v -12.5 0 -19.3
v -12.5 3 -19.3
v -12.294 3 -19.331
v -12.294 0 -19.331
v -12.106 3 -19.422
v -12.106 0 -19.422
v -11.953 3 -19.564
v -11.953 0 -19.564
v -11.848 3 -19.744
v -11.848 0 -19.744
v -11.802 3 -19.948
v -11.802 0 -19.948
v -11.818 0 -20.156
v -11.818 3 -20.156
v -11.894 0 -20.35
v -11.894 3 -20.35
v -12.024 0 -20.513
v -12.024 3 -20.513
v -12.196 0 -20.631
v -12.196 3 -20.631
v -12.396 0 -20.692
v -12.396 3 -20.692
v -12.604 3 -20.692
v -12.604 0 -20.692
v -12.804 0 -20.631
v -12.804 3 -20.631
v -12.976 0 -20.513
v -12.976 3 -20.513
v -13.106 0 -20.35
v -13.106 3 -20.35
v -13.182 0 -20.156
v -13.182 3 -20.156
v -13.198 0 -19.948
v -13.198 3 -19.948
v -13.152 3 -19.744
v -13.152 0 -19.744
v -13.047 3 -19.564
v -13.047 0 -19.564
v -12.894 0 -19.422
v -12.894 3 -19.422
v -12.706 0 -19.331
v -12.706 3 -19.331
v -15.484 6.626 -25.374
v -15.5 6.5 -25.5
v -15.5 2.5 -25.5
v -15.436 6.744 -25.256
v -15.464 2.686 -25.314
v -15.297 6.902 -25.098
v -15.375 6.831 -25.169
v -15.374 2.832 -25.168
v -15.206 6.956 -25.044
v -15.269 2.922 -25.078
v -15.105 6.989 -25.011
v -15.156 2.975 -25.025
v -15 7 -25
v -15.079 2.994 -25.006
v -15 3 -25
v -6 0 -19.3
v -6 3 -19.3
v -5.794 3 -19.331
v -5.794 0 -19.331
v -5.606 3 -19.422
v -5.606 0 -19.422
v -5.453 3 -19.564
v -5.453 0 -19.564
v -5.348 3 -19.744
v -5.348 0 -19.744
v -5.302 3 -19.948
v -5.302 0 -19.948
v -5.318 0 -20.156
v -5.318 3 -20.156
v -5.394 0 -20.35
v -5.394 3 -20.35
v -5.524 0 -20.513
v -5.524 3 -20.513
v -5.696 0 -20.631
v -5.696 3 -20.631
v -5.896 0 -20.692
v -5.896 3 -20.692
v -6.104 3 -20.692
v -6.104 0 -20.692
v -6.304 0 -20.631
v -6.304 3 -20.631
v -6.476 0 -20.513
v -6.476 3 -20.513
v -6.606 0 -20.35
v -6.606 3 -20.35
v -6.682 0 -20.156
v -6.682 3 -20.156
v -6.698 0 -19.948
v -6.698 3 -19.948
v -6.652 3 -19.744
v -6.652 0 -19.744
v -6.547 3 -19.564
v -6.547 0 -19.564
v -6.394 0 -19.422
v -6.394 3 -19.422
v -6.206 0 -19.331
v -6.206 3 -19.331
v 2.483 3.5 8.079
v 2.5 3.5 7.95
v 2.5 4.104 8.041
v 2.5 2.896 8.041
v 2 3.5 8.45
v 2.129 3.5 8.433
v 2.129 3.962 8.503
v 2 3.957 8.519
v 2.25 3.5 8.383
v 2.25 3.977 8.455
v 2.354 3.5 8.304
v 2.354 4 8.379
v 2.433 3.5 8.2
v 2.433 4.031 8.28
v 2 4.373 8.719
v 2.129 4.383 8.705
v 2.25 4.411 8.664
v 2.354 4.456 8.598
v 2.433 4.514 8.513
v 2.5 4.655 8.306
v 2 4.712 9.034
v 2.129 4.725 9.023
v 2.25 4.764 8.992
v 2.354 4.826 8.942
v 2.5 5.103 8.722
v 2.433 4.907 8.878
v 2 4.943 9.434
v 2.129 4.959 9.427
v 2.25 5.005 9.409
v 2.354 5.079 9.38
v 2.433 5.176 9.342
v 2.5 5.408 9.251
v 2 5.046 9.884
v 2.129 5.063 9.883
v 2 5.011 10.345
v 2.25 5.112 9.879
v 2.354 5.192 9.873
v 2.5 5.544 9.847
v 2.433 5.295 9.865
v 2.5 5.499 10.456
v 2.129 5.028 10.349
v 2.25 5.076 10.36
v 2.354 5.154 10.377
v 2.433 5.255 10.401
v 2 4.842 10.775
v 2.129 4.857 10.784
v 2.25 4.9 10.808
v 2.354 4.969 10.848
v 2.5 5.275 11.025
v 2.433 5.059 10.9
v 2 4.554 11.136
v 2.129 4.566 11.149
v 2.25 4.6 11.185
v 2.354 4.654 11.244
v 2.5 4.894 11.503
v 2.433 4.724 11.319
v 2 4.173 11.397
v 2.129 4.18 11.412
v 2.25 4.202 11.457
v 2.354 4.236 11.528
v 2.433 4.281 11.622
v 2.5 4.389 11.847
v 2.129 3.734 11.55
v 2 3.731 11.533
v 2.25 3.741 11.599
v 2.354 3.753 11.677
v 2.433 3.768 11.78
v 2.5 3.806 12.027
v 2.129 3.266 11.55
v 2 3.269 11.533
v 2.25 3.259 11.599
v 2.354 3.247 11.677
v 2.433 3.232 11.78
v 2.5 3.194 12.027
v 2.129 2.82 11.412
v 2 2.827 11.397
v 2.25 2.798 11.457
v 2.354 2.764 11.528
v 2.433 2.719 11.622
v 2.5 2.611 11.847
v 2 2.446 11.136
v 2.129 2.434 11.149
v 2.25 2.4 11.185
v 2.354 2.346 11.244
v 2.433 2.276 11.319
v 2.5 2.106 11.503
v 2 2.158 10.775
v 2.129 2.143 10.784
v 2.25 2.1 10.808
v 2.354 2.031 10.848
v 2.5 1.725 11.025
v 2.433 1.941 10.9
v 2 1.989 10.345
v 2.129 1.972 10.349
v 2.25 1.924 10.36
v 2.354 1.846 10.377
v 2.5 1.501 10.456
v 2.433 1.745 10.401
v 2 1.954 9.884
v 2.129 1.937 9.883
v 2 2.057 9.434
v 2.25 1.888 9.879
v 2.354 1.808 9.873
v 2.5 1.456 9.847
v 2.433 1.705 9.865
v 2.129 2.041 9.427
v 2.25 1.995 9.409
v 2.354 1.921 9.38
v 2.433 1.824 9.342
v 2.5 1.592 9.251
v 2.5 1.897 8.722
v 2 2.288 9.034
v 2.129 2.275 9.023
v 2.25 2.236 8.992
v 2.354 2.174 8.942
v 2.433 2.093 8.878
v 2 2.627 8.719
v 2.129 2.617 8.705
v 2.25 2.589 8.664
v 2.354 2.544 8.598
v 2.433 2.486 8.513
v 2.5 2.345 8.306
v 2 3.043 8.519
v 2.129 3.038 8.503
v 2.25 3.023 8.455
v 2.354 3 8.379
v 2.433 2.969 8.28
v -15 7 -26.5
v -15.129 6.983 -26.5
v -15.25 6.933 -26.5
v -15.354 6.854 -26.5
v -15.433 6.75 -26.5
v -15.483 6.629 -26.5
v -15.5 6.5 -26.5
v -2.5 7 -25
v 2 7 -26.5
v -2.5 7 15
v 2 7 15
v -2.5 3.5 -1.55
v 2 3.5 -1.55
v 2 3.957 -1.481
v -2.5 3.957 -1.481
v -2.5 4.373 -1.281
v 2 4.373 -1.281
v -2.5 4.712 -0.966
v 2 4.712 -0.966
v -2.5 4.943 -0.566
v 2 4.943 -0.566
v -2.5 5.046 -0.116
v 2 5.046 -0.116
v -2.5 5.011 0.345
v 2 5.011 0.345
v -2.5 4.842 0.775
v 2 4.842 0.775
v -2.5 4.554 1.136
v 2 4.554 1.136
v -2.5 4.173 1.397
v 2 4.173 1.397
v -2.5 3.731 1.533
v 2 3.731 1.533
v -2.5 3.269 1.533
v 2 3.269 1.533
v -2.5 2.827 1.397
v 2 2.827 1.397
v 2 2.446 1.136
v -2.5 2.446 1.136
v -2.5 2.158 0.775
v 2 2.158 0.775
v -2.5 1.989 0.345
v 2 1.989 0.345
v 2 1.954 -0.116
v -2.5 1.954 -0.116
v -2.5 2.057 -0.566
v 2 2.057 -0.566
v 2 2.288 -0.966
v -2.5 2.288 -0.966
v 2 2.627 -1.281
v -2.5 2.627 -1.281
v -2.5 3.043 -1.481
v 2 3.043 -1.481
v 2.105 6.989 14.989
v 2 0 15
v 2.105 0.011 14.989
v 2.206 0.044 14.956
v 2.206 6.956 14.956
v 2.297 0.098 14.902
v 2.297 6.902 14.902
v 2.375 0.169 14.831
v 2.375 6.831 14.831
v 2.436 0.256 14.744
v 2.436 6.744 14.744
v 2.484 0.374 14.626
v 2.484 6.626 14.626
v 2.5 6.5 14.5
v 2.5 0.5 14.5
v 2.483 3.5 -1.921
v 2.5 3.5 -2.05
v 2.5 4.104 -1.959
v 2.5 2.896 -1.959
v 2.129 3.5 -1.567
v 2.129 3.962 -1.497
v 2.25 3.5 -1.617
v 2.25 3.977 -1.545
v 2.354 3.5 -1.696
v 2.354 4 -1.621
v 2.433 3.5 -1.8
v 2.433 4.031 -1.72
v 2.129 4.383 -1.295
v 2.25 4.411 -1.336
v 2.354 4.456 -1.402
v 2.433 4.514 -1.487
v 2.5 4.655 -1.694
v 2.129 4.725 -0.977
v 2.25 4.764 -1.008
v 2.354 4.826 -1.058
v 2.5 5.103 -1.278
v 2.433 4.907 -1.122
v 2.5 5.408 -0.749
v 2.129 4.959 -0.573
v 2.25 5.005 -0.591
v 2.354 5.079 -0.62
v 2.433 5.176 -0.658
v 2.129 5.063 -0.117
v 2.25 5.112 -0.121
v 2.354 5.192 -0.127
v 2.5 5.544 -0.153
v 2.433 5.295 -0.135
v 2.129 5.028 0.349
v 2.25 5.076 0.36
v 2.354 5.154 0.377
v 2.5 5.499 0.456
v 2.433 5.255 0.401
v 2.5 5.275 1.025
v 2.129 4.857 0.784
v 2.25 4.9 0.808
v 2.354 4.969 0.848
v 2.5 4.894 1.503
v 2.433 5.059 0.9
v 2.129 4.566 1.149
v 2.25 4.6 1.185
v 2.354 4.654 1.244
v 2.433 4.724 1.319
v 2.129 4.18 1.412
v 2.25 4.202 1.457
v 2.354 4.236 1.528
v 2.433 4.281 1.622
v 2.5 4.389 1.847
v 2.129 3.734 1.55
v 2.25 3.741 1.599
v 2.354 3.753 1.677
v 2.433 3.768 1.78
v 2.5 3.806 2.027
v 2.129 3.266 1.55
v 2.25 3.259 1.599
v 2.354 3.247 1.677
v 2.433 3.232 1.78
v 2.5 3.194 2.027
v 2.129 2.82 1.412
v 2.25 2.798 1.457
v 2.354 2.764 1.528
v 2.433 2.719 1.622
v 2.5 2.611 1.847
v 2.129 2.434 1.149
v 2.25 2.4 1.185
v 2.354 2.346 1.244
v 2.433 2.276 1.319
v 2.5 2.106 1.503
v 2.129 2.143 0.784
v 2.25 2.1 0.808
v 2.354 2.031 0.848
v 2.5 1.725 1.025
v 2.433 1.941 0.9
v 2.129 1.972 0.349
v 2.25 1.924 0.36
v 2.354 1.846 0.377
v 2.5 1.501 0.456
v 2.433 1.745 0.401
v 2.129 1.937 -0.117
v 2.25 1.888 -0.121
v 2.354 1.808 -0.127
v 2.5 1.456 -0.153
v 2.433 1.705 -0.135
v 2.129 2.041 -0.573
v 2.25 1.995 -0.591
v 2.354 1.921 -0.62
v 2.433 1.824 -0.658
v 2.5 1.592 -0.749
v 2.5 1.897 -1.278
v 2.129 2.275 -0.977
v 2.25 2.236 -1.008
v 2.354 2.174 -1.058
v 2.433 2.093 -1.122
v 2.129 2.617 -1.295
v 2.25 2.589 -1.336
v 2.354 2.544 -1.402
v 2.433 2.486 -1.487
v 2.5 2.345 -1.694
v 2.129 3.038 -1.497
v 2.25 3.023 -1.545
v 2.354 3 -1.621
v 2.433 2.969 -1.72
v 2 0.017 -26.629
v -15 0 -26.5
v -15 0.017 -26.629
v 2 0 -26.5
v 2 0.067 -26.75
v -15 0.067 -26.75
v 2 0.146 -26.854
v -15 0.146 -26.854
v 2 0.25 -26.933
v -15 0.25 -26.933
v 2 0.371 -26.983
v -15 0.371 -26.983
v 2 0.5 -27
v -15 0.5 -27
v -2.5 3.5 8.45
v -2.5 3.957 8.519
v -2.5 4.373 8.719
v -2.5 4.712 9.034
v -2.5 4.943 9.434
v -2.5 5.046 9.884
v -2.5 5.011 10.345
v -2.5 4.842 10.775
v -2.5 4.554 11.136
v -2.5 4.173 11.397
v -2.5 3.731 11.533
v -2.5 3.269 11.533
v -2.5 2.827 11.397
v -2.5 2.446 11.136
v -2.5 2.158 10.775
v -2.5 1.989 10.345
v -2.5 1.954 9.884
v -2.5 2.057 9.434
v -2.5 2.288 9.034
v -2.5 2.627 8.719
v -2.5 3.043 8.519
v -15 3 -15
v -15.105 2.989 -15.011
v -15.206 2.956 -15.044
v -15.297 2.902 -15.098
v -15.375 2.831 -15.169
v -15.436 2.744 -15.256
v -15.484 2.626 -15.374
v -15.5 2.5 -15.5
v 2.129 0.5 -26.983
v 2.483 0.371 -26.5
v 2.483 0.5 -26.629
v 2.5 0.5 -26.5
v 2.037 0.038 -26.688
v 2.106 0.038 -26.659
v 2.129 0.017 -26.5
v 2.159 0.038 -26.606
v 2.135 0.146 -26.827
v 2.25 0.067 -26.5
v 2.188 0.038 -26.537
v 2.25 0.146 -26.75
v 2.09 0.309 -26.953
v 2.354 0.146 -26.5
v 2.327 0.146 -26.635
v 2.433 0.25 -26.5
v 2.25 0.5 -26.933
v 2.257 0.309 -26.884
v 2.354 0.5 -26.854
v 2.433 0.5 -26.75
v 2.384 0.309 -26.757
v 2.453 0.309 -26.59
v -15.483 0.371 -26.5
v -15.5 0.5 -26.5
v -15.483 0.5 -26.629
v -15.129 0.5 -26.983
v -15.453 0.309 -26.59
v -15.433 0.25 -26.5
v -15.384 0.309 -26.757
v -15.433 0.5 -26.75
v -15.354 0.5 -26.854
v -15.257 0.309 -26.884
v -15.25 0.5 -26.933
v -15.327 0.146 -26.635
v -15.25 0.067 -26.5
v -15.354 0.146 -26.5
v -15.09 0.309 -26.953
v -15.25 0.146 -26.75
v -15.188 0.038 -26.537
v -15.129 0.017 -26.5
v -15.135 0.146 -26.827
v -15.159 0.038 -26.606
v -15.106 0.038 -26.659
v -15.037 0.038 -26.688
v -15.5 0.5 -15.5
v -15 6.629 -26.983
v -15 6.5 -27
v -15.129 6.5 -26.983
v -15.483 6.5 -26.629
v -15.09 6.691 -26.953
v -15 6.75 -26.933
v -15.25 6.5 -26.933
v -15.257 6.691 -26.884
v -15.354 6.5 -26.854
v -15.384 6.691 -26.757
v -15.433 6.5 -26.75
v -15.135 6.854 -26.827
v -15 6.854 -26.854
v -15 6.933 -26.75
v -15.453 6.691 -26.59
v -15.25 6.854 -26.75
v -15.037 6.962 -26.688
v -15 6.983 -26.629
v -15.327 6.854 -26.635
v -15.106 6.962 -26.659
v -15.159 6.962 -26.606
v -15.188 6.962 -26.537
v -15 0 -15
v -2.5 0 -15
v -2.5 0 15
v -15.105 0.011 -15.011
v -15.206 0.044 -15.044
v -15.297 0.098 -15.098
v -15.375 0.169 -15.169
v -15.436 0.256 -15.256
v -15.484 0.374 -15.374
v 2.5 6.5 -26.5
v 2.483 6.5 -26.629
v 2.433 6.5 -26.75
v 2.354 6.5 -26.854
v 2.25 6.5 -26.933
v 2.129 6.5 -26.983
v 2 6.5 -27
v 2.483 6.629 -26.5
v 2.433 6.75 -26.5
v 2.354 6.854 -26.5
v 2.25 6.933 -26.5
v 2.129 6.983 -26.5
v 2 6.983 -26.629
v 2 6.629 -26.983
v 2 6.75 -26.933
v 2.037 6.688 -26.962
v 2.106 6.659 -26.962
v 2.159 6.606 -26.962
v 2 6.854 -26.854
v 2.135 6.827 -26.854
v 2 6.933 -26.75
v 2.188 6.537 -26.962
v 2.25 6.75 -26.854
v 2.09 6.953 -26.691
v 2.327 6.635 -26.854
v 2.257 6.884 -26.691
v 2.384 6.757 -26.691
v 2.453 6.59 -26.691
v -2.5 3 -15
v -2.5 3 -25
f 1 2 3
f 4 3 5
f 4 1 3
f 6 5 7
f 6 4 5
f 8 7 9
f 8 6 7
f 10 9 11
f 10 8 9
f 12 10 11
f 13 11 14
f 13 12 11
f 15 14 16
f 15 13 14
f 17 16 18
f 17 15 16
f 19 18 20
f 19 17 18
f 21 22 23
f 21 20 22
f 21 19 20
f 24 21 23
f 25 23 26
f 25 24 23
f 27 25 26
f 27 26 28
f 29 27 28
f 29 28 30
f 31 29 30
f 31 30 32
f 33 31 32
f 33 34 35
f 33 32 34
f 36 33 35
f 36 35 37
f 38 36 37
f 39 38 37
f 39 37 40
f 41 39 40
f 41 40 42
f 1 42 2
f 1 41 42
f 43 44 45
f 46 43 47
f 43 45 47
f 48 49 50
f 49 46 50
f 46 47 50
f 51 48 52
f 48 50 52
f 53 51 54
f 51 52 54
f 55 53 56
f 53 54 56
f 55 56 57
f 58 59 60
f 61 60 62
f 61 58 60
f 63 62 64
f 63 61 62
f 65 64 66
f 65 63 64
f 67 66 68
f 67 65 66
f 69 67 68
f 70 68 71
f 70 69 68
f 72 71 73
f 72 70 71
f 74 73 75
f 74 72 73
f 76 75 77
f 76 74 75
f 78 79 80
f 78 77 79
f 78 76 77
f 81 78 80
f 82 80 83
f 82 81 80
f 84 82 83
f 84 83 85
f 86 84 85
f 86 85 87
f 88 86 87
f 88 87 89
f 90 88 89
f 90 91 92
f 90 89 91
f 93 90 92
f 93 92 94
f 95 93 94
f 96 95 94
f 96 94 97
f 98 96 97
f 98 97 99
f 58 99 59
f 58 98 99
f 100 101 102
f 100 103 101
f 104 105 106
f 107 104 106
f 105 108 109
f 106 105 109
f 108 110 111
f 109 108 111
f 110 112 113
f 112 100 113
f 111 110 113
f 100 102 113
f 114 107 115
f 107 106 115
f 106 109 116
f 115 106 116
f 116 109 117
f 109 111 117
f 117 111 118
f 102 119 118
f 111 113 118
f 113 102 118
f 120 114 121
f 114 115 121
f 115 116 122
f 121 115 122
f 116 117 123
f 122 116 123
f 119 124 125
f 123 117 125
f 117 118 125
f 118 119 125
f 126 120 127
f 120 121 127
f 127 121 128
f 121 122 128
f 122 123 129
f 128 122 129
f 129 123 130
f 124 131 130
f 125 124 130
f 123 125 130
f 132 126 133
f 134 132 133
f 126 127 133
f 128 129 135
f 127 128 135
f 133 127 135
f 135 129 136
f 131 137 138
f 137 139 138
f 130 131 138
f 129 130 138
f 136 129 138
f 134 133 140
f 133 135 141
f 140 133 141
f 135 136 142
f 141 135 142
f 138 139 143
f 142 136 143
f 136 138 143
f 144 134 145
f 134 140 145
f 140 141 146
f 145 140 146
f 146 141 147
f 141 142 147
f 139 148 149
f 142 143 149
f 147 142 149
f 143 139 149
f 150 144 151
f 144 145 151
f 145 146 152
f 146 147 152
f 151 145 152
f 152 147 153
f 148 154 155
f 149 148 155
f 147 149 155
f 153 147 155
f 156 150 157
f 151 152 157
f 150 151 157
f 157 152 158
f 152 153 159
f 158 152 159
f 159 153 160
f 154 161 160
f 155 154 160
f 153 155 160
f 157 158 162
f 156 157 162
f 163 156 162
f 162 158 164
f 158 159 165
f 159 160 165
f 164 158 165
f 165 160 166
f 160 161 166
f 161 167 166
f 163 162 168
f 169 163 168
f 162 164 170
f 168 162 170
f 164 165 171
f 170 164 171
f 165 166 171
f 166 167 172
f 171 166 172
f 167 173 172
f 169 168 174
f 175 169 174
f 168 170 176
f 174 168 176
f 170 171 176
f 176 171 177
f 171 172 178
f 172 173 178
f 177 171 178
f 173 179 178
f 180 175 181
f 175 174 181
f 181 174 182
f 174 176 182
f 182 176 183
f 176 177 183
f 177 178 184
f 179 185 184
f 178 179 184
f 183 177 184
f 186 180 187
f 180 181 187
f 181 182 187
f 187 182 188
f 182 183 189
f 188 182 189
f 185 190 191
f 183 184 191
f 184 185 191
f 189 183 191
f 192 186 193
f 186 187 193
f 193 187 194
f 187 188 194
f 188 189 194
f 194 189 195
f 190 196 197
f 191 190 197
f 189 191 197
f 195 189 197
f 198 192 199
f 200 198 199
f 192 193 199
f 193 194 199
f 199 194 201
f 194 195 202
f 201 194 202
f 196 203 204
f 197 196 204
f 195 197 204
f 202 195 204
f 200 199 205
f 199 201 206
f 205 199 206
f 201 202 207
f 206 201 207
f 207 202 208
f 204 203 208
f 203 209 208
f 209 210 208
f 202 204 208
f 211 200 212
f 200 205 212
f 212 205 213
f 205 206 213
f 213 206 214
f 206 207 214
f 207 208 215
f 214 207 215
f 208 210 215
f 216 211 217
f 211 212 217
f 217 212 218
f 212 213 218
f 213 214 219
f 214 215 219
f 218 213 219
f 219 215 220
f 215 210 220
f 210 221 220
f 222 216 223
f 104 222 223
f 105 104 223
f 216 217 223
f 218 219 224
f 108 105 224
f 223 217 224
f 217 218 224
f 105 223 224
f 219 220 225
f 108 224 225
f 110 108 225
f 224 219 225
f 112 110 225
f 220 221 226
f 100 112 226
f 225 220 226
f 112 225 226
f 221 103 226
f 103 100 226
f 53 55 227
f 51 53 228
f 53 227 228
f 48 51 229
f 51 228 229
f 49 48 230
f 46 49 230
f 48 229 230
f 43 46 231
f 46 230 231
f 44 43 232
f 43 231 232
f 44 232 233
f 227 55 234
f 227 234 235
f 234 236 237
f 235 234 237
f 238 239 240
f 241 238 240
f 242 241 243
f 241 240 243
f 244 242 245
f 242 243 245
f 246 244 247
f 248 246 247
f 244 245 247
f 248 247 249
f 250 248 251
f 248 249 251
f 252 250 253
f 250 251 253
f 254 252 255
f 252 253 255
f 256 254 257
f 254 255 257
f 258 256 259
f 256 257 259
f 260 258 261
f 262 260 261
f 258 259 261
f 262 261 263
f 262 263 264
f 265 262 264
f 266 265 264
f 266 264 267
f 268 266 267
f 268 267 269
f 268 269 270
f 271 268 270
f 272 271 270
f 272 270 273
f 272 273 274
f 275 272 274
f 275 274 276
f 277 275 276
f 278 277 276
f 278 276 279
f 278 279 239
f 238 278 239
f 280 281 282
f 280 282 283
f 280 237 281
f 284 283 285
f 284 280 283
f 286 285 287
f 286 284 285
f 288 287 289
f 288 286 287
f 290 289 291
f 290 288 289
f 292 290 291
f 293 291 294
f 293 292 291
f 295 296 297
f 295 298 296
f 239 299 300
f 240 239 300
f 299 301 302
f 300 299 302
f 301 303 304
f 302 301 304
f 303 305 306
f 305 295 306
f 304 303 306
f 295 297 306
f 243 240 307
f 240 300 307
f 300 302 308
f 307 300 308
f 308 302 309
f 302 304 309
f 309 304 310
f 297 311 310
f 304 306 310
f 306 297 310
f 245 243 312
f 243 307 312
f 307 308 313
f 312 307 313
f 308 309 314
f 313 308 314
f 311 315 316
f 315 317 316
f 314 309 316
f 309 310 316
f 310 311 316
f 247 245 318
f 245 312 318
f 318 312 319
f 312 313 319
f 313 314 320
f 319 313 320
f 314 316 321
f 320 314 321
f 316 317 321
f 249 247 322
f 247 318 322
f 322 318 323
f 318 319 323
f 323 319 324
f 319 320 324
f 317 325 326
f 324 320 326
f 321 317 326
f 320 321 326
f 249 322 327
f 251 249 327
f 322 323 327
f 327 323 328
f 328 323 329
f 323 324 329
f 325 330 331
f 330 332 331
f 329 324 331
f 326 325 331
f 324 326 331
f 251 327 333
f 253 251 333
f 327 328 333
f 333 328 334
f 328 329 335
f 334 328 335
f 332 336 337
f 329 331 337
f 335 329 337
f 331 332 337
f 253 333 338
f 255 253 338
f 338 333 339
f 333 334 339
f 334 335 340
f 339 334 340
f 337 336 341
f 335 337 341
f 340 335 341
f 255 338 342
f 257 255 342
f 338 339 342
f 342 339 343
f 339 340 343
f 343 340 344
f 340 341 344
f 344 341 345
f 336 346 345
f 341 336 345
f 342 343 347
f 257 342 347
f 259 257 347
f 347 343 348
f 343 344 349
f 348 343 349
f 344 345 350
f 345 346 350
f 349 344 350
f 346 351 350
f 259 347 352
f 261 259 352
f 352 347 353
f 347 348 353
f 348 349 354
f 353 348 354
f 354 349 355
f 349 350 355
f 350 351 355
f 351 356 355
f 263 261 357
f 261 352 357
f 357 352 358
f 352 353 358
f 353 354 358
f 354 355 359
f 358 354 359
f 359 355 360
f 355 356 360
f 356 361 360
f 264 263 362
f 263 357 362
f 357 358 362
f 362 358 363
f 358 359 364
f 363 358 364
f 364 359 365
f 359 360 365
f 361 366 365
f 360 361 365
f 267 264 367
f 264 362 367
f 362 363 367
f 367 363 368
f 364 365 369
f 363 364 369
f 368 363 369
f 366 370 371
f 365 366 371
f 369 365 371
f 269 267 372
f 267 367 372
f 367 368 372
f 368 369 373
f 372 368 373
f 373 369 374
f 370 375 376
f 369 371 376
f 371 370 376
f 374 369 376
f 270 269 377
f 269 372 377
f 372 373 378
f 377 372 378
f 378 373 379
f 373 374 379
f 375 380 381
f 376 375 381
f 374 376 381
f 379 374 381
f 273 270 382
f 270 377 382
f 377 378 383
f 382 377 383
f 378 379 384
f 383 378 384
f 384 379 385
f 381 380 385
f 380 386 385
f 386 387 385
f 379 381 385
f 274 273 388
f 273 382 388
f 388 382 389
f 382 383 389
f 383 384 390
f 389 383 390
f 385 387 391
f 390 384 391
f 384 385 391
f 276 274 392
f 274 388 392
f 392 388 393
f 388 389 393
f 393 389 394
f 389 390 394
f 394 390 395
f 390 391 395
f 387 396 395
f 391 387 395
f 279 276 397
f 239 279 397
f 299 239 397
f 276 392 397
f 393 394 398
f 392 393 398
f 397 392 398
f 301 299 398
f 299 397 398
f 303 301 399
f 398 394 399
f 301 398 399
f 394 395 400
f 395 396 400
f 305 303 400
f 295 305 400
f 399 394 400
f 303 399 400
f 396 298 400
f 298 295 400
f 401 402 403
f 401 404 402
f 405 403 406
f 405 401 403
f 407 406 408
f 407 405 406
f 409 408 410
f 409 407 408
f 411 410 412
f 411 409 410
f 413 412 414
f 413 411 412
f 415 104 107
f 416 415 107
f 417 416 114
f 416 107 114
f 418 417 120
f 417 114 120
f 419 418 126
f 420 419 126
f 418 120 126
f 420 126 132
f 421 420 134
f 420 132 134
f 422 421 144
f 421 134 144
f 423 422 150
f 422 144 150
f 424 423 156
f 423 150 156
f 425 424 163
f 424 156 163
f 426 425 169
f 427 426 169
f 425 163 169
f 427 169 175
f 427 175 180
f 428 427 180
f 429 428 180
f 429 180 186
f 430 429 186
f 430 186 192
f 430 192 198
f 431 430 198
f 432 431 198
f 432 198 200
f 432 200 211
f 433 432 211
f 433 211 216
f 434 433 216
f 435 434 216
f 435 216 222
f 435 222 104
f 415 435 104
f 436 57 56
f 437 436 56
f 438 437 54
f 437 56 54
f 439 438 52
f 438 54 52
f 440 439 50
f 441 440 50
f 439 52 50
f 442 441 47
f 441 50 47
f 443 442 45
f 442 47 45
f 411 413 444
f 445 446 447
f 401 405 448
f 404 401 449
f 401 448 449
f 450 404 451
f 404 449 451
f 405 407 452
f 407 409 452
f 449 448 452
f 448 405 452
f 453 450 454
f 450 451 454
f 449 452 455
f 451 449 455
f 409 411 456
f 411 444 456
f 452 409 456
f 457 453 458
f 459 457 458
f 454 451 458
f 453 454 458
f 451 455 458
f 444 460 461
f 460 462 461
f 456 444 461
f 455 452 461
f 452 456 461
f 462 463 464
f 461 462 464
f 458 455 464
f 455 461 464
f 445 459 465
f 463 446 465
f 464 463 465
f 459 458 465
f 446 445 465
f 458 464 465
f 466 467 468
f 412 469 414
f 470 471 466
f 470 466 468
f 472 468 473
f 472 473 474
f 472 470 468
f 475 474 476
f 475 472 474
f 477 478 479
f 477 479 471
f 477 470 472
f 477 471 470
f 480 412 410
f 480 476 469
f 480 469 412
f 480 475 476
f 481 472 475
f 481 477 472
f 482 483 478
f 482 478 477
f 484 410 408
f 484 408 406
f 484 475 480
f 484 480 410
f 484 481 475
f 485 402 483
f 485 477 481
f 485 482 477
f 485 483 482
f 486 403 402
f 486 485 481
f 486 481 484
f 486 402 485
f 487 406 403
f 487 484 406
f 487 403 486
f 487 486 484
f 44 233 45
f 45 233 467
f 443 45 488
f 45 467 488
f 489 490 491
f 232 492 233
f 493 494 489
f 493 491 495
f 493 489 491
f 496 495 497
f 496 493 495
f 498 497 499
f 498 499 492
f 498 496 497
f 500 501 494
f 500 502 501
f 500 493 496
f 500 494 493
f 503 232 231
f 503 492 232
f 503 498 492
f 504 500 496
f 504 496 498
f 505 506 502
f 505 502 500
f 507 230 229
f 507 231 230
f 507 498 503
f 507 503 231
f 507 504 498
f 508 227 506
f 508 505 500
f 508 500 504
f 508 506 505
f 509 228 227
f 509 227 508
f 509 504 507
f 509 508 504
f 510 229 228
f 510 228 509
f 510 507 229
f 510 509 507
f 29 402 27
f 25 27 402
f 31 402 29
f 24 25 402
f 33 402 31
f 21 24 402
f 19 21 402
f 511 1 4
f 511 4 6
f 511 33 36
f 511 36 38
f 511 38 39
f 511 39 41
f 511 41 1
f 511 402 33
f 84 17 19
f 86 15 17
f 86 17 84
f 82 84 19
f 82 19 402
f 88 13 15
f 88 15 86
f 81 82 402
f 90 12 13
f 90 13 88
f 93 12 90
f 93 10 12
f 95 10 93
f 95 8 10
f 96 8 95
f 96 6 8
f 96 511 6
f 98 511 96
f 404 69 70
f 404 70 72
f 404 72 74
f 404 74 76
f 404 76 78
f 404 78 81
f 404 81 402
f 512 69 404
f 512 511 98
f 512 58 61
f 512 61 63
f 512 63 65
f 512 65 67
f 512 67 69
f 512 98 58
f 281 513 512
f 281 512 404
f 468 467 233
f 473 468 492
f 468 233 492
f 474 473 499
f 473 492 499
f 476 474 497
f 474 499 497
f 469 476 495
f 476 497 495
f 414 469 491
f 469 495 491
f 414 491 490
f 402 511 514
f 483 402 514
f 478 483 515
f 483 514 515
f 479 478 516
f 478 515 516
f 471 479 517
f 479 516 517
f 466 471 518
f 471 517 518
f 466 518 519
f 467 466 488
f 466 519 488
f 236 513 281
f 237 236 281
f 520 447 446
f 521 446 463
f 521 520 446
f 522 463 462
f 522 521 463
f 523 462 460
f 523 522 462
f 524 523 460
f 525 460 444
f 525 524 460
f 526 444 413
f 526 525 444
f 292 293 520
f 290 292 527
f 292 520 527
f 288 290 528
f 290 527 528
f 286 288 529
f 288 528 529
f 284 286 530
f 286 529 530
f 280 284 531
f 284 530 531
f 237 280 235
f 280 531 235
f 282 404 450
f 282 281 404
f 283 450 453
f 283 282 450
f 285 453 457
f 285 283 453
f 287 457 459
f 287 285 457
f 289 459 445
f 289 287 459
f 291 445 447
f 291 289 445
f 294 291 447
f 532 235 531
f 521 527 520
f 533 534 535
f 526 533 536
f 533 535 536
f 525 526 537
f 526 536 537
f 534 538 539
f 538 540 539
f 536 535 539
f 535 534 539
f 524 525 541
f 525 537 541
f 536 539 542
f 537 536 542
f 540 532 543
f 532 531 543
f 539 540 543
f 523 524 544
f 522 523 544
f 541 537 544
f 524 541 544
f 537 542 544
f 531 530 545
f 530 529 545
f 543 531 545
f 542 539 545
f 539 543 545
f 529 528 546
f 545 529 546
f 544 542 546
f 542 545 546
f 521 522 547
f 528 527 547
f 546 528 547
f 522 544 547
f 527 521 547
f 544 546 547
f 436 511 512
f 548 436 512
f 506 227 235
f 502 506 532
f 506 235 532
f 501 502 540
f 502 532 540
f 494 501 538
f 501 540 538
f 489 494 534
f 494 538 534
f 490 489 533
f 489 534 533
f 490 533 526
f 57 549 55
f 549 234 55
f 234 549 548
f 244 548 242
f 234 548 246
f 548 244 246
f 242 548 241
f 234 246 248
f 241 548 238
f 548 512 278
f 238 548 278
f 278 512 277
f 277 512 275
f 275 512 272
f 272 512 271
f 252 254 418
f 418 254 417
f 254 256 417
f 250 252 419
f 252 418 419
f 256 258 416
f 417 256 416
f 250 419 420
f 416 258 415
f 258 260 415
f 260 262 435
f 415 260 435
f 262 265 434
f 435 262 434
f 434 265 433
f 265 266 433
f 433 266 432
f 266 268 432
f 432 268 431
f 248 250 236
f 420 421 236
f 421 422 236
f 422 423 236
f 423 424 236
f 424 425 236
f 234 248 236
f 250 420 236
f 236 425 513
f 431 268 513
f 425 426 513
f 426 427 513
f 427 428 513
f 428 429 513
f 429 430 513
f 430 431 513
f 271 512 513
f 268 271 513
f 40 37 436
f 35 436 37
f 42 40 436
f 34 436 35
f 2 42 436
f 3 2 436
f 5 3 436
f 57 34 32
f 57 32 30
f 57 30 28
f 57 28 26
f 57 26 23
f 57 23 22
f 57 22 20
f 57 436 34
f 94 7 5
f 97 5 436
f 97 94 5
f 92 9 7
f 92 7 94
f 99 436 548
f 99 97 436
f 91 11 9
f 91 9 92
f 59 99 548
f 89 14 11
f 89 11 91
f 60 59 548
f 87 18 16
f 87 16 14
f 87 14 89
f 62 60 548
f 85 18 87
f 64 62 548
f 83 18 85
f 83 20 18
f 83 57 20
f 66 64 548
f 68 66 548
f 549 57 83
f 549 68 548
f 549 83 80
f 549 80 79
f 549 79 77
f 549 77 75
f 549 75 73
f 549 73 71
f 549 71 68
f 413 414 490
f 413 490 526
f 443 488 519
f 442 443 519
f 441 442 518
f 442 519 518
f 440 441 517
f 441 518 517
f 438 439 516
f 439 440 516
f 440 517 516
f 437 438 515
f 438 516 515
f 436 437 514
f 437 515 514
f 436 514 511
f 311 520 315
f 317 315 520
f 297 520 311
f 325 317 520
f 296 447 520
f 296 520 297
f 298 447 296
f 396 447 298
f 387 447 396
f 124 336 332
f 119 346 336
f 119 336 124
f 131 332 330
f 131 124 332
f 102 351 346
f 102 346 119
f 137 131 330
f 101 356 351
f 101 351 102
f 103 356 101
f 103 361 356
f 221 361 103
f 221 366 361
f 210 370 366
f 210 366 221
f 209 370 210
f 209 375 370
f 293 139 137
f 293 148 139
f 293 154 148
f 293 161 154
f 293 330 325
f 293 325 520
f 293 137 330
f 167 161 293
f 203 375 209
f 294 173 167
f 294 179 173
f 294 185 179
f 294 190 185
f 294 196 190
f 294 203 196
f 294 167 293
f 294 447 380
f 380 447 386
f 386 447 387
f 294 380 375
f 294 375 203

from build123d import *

# Parameters (mm, degrees)
SKETCH_1_R          = 0.7
EXTRUDE_1_DEPTH     = 7
SKETCH_2_R          = 1.55
CUT_EXTRUDE_1_DEPTH = 32.591137998
SKETCH_3_W          = 13
SKETCH_3_H          = 10
CUT_EXTRUDE_2_DEPTH = 4
SKETCH_4_W          = 18
SKETCH_4_H          = 2
EXTRUDE_2_DEPTH     = 7
FILLET_1_R          = 0.5
FILLET_2_R          = 0.5


with BuildPart() as part:
    # 草图1 → 凸台-拉伸1 (new body)
    with BuildSketch(Plane(origin=(0, 0, 0), x_dir=(1, 0, 0), z_dir=(0, 1, 0))):
        Polygon((-2.5, 15), (-2.5, -15), (2.5, -15), (2.5, 15), (2.5, 25), (-15.5, 25), (-15.5, 15), align=None)
        with Locations(Location((-12.5, 20, 0), (0, 0, 270))):
            Circle(SKETCH_1_R, mode=Mode.SUBTRACT)
        with Locations(Location((-6, 20, 0), (0, 0, 270))):
            Circle(SKETCH_1_R, mode=Mode.SUBTRACT)
    extrude(amount=EXTRUDE_1_DEPTH)

    # 草图2 → 切除-拉伸1 (cut, through all)
    with BuildSketch(Plane(origin=(2.5, 0, 0), x_dir=(0, 0, -1), z_dir=(1, 0, 0))):
        with Locations((-10, 3.5)):
            Circle(SKETCH_2_R)
        with Locations((0, 3.5)):
            Circle(SKETCH_2_R)
    extrude(amount=-CUT_EXTRUDE_1_DEPTH, mode=Mode.SUBTRACT)

    # 草图3 → 切除-拉伸2 (cut)
    with BuildSketch(Plane(origin=(0, 7, 0), x_dir=(1, 0, 0), z_dir=(0, 1, 0))):
        with Locations((-9, 20)):
            Rectangle(SKETCH_3_W, SKETCH_3_H)
    extrude(amount=-CUT_EXTRUDE_2_DEPTH, mode=Mode.SUBTRACT)

    # 草图4 → 凸台-拉伸2 (add)
    with BuildSketch(Plane.XZ):
        with Locations((-6.5, -26)):
            Rectangle(SKETCH_4_W, SKETCH_4_H)
    extrude(amount=-EXTRUDE_2_DEPTH)

    # 圆角1
    fillet_1_edges = [part.edges().sort_by_distance(p)[0] for p in [
        (2.5, 3.5, 15),
        (2.5, 3.5, 11.55),
        (2.5, 3.5, 1.55),
        (2.5, 7, -6),
        (-15.5, 3.5, -27),
        (-6.5, 7, -27),
        (2.5, 3.5, -27),
        (-6.5, 0, -27),
        (2.5, 0, -6),
    ]]
    fillet(fillet_1_edges, radius=FILLET_1_R)

    # 圆角2
    # the kernel refuses this fillet: 0.5 mm, written as the material it takes off along each edge
    with BuildSketch(Plane(origin=(-15, 6.5, -26.5), x_dir=(-1, 0, 0), z_dir=(0, 1, 0))) as fillet_2_piece_1_section:
        Polygon((0, 0), (FILLET_2_R, 0), (FILLET_2_R, -FILLET_2_R), (0, -FILLET_2_R), align=None)
    fillet_2_piece_1 = extrude(amount=FILLET_2_R, mode=Mode.PRIVATE)
    fillet_2_piece_1 = fillet_2_piece_1 - Plane(origin=(-15, 6.5, -26.5), x_dir=(0.7071067811865475, 0, 0.7071067811865475), z_dir=(0, 1, 0)) * Sphere(FILLET_2_R, mode=Mode.PRIVATE)
    add(fillet_2_piece_1, mode=Mode.SUBTRACT)
    with BuildSketch(Plane(origin=(-15, 0.5, -26.5), x_dir=(-1, 0, 0), z_dir=(0, -1, 0))) as fillet_2_piece_2_section:
        Polygon((0, 0), (FILLET_2_R, 0), (FILLET_2_R, FILLET_2_R), (0, FILLET_2_R), align=None)
    fillet_2_piece_2 = extrude(amount=FILLET_2_R, mode=Mode.PRIVATE)
    fillet_2_piece_2 = fillet_2_piece_2 - Plane(origin=(-15, 0.5, -26.5), x_dir=(0.7071067811865475, 0, 0.7071067811865475), z_dir=(0, -1, 0)) * Sphere(FILLET_2_R, mode=Mode.PRIVATE)
    add(fillet_2_piece_2, mode=Mode.SUBTRACT)
    with BuildSketch(Plane(origin=(-15.5, -1.25, -15), x_dir=(1, 0, 0), z_dir=(0, 1, 0))) as fillet_2_piece_3:
        with BuildLine():
            CenterArc((FILLET_2_R, FILLET_2_R), FILLET_2_R, 180, 90)
            Line((0, FILLET_2_R), (0, 0))
            Line((0, 0), (FILLET_2_R, 0))
        make_face()
    extrude(amount=5.5, mode=Mode.SUBTRACT)
    with BuildSketch(Plane(origin=(-15.5, 3, -25), x_dir=(1, 0, 0), z_dir=(0, 0, 1))) as fillet_2_piece_4:
        with BuildLine():
            CenterArc((FILLET_2_R, -FILLET_2_R), FILLET_2_R, 90, 90)
            Line((0, -FILLET_2_R), (0, 0))
            Line((0, 0), (FILLET_2_R, 0))
        make_face()
    extrude(amount=11.25, mode=Mode.SUBTRACT)
    with BuildSketch(Plane(origin=(-15.5, 3, -25), x_dir=(1, 0, 0), z_dir=(0, 1, 0))) as fillet_2_piece_5:
        with BuildLine():
            CenterArc((FILLET_2_R, FILLET_2_R), FILLET_2_R, 180, 90)
            Line((0, FILLET_2_R), (0, 0))
            Line((0, 0), (FILLET_2_R, 0))
        make_face()
    extrude(amount=5.25, mode=Mode.SUBTRACT)
    with BuildSketch(Plane(origin=(-15.5, 7, -26.5), x_dir=(1, 0, 0), z_dir=(0, 0, 1))) as fillet_2_piece_6:
        with BuildLine():
            CenterArc((FILLET_2_R, -FILLET_2_R), FILLET_2_R, 90, 90)
            Line((0, -FILLET_2_R), (0, 0))
            Line((0, 0), (FILLET_2_R, 0))
        make_face()
    extrude(amount=2.75, mode=Mode.SUBTRACT)
    with BuildSketch(Plane(origin=(-15.5, 0, -13.75), x_dir=(1, 0, 0), z_dir=(0, 0, -1))) as fillet_2_piece_7:
        with BuildLine():
            CenterArc((FILLET_2_R, -FILLET_2_R), FILLET_2_R, 90, 90)
            Line((0, -FILLET_2_R), (0, 0))
            Line((0, 0), (FILLET_2_R, 0))
        make_face()
    extrude(amount=12.75, mode=Mode.SUBTRACT)
    with BuildSketch(Plane(origin=(-15.5, 3, -26.25), x_dir=(1, 0, 0), z_dir=(0, 0, 1))) as fillet_2_piece_8a_section:
        with BuildLine():
            CenterArc((FILLET_2_R, -FILLET_2_R), FILLET_2_R, 90, 90)
            Line((0, -FILLET_2_R), (0, 0))
            Line((0, 0), (FILLET_2_R, 0))
        make_face()
    fillet_2_piece_8a = extrude(amount=12.5, mode=Mode.PRIVATE)
    fillet_2_piece_8a = split(fillet_2_piece_8a, bisect_by=Plane(origin=(-15.386802443, 2.886802443, -25), z_dir=(0, 0, -1)), keep=Keep.TOP, mode=Mode.PRIVATE)
    with BuildSketch(Plane(origin=(-15.5, 1.75, -25), x_dir=(1, 0, 0), z_dir=(0, 1, 0))) as fillet_2_piece_8b_section:
        with BuildLine():
            CenterArc((FILLET_2_R, FILLET_2_R), FILLET_2_R, 180, 90)
            Line((0, FILLET_2_R), (0, 0))
            Line((0, 0), (FILLET_2_R, 0))
        make_face()
    fillet_2_piece_8b = extrude(amount=6.5, mode=Mode.PRIVATE)
    fillet_2_piece_8b = split(fillet_2_piece_8b, bisect_by=Plane(origin=(-15.386802443, 3, -25.113197557), z_dir=(0, -1, 0)), keep=Keep.TOP, mode=Mode.PRIVATE)
    fillet_2_piece_8 = fillet_2_piece_8a & fillet_2_piece_8b
    add(fillet_2_piece_8, mode=Mode.SUBTRACT)


solid = part.part
